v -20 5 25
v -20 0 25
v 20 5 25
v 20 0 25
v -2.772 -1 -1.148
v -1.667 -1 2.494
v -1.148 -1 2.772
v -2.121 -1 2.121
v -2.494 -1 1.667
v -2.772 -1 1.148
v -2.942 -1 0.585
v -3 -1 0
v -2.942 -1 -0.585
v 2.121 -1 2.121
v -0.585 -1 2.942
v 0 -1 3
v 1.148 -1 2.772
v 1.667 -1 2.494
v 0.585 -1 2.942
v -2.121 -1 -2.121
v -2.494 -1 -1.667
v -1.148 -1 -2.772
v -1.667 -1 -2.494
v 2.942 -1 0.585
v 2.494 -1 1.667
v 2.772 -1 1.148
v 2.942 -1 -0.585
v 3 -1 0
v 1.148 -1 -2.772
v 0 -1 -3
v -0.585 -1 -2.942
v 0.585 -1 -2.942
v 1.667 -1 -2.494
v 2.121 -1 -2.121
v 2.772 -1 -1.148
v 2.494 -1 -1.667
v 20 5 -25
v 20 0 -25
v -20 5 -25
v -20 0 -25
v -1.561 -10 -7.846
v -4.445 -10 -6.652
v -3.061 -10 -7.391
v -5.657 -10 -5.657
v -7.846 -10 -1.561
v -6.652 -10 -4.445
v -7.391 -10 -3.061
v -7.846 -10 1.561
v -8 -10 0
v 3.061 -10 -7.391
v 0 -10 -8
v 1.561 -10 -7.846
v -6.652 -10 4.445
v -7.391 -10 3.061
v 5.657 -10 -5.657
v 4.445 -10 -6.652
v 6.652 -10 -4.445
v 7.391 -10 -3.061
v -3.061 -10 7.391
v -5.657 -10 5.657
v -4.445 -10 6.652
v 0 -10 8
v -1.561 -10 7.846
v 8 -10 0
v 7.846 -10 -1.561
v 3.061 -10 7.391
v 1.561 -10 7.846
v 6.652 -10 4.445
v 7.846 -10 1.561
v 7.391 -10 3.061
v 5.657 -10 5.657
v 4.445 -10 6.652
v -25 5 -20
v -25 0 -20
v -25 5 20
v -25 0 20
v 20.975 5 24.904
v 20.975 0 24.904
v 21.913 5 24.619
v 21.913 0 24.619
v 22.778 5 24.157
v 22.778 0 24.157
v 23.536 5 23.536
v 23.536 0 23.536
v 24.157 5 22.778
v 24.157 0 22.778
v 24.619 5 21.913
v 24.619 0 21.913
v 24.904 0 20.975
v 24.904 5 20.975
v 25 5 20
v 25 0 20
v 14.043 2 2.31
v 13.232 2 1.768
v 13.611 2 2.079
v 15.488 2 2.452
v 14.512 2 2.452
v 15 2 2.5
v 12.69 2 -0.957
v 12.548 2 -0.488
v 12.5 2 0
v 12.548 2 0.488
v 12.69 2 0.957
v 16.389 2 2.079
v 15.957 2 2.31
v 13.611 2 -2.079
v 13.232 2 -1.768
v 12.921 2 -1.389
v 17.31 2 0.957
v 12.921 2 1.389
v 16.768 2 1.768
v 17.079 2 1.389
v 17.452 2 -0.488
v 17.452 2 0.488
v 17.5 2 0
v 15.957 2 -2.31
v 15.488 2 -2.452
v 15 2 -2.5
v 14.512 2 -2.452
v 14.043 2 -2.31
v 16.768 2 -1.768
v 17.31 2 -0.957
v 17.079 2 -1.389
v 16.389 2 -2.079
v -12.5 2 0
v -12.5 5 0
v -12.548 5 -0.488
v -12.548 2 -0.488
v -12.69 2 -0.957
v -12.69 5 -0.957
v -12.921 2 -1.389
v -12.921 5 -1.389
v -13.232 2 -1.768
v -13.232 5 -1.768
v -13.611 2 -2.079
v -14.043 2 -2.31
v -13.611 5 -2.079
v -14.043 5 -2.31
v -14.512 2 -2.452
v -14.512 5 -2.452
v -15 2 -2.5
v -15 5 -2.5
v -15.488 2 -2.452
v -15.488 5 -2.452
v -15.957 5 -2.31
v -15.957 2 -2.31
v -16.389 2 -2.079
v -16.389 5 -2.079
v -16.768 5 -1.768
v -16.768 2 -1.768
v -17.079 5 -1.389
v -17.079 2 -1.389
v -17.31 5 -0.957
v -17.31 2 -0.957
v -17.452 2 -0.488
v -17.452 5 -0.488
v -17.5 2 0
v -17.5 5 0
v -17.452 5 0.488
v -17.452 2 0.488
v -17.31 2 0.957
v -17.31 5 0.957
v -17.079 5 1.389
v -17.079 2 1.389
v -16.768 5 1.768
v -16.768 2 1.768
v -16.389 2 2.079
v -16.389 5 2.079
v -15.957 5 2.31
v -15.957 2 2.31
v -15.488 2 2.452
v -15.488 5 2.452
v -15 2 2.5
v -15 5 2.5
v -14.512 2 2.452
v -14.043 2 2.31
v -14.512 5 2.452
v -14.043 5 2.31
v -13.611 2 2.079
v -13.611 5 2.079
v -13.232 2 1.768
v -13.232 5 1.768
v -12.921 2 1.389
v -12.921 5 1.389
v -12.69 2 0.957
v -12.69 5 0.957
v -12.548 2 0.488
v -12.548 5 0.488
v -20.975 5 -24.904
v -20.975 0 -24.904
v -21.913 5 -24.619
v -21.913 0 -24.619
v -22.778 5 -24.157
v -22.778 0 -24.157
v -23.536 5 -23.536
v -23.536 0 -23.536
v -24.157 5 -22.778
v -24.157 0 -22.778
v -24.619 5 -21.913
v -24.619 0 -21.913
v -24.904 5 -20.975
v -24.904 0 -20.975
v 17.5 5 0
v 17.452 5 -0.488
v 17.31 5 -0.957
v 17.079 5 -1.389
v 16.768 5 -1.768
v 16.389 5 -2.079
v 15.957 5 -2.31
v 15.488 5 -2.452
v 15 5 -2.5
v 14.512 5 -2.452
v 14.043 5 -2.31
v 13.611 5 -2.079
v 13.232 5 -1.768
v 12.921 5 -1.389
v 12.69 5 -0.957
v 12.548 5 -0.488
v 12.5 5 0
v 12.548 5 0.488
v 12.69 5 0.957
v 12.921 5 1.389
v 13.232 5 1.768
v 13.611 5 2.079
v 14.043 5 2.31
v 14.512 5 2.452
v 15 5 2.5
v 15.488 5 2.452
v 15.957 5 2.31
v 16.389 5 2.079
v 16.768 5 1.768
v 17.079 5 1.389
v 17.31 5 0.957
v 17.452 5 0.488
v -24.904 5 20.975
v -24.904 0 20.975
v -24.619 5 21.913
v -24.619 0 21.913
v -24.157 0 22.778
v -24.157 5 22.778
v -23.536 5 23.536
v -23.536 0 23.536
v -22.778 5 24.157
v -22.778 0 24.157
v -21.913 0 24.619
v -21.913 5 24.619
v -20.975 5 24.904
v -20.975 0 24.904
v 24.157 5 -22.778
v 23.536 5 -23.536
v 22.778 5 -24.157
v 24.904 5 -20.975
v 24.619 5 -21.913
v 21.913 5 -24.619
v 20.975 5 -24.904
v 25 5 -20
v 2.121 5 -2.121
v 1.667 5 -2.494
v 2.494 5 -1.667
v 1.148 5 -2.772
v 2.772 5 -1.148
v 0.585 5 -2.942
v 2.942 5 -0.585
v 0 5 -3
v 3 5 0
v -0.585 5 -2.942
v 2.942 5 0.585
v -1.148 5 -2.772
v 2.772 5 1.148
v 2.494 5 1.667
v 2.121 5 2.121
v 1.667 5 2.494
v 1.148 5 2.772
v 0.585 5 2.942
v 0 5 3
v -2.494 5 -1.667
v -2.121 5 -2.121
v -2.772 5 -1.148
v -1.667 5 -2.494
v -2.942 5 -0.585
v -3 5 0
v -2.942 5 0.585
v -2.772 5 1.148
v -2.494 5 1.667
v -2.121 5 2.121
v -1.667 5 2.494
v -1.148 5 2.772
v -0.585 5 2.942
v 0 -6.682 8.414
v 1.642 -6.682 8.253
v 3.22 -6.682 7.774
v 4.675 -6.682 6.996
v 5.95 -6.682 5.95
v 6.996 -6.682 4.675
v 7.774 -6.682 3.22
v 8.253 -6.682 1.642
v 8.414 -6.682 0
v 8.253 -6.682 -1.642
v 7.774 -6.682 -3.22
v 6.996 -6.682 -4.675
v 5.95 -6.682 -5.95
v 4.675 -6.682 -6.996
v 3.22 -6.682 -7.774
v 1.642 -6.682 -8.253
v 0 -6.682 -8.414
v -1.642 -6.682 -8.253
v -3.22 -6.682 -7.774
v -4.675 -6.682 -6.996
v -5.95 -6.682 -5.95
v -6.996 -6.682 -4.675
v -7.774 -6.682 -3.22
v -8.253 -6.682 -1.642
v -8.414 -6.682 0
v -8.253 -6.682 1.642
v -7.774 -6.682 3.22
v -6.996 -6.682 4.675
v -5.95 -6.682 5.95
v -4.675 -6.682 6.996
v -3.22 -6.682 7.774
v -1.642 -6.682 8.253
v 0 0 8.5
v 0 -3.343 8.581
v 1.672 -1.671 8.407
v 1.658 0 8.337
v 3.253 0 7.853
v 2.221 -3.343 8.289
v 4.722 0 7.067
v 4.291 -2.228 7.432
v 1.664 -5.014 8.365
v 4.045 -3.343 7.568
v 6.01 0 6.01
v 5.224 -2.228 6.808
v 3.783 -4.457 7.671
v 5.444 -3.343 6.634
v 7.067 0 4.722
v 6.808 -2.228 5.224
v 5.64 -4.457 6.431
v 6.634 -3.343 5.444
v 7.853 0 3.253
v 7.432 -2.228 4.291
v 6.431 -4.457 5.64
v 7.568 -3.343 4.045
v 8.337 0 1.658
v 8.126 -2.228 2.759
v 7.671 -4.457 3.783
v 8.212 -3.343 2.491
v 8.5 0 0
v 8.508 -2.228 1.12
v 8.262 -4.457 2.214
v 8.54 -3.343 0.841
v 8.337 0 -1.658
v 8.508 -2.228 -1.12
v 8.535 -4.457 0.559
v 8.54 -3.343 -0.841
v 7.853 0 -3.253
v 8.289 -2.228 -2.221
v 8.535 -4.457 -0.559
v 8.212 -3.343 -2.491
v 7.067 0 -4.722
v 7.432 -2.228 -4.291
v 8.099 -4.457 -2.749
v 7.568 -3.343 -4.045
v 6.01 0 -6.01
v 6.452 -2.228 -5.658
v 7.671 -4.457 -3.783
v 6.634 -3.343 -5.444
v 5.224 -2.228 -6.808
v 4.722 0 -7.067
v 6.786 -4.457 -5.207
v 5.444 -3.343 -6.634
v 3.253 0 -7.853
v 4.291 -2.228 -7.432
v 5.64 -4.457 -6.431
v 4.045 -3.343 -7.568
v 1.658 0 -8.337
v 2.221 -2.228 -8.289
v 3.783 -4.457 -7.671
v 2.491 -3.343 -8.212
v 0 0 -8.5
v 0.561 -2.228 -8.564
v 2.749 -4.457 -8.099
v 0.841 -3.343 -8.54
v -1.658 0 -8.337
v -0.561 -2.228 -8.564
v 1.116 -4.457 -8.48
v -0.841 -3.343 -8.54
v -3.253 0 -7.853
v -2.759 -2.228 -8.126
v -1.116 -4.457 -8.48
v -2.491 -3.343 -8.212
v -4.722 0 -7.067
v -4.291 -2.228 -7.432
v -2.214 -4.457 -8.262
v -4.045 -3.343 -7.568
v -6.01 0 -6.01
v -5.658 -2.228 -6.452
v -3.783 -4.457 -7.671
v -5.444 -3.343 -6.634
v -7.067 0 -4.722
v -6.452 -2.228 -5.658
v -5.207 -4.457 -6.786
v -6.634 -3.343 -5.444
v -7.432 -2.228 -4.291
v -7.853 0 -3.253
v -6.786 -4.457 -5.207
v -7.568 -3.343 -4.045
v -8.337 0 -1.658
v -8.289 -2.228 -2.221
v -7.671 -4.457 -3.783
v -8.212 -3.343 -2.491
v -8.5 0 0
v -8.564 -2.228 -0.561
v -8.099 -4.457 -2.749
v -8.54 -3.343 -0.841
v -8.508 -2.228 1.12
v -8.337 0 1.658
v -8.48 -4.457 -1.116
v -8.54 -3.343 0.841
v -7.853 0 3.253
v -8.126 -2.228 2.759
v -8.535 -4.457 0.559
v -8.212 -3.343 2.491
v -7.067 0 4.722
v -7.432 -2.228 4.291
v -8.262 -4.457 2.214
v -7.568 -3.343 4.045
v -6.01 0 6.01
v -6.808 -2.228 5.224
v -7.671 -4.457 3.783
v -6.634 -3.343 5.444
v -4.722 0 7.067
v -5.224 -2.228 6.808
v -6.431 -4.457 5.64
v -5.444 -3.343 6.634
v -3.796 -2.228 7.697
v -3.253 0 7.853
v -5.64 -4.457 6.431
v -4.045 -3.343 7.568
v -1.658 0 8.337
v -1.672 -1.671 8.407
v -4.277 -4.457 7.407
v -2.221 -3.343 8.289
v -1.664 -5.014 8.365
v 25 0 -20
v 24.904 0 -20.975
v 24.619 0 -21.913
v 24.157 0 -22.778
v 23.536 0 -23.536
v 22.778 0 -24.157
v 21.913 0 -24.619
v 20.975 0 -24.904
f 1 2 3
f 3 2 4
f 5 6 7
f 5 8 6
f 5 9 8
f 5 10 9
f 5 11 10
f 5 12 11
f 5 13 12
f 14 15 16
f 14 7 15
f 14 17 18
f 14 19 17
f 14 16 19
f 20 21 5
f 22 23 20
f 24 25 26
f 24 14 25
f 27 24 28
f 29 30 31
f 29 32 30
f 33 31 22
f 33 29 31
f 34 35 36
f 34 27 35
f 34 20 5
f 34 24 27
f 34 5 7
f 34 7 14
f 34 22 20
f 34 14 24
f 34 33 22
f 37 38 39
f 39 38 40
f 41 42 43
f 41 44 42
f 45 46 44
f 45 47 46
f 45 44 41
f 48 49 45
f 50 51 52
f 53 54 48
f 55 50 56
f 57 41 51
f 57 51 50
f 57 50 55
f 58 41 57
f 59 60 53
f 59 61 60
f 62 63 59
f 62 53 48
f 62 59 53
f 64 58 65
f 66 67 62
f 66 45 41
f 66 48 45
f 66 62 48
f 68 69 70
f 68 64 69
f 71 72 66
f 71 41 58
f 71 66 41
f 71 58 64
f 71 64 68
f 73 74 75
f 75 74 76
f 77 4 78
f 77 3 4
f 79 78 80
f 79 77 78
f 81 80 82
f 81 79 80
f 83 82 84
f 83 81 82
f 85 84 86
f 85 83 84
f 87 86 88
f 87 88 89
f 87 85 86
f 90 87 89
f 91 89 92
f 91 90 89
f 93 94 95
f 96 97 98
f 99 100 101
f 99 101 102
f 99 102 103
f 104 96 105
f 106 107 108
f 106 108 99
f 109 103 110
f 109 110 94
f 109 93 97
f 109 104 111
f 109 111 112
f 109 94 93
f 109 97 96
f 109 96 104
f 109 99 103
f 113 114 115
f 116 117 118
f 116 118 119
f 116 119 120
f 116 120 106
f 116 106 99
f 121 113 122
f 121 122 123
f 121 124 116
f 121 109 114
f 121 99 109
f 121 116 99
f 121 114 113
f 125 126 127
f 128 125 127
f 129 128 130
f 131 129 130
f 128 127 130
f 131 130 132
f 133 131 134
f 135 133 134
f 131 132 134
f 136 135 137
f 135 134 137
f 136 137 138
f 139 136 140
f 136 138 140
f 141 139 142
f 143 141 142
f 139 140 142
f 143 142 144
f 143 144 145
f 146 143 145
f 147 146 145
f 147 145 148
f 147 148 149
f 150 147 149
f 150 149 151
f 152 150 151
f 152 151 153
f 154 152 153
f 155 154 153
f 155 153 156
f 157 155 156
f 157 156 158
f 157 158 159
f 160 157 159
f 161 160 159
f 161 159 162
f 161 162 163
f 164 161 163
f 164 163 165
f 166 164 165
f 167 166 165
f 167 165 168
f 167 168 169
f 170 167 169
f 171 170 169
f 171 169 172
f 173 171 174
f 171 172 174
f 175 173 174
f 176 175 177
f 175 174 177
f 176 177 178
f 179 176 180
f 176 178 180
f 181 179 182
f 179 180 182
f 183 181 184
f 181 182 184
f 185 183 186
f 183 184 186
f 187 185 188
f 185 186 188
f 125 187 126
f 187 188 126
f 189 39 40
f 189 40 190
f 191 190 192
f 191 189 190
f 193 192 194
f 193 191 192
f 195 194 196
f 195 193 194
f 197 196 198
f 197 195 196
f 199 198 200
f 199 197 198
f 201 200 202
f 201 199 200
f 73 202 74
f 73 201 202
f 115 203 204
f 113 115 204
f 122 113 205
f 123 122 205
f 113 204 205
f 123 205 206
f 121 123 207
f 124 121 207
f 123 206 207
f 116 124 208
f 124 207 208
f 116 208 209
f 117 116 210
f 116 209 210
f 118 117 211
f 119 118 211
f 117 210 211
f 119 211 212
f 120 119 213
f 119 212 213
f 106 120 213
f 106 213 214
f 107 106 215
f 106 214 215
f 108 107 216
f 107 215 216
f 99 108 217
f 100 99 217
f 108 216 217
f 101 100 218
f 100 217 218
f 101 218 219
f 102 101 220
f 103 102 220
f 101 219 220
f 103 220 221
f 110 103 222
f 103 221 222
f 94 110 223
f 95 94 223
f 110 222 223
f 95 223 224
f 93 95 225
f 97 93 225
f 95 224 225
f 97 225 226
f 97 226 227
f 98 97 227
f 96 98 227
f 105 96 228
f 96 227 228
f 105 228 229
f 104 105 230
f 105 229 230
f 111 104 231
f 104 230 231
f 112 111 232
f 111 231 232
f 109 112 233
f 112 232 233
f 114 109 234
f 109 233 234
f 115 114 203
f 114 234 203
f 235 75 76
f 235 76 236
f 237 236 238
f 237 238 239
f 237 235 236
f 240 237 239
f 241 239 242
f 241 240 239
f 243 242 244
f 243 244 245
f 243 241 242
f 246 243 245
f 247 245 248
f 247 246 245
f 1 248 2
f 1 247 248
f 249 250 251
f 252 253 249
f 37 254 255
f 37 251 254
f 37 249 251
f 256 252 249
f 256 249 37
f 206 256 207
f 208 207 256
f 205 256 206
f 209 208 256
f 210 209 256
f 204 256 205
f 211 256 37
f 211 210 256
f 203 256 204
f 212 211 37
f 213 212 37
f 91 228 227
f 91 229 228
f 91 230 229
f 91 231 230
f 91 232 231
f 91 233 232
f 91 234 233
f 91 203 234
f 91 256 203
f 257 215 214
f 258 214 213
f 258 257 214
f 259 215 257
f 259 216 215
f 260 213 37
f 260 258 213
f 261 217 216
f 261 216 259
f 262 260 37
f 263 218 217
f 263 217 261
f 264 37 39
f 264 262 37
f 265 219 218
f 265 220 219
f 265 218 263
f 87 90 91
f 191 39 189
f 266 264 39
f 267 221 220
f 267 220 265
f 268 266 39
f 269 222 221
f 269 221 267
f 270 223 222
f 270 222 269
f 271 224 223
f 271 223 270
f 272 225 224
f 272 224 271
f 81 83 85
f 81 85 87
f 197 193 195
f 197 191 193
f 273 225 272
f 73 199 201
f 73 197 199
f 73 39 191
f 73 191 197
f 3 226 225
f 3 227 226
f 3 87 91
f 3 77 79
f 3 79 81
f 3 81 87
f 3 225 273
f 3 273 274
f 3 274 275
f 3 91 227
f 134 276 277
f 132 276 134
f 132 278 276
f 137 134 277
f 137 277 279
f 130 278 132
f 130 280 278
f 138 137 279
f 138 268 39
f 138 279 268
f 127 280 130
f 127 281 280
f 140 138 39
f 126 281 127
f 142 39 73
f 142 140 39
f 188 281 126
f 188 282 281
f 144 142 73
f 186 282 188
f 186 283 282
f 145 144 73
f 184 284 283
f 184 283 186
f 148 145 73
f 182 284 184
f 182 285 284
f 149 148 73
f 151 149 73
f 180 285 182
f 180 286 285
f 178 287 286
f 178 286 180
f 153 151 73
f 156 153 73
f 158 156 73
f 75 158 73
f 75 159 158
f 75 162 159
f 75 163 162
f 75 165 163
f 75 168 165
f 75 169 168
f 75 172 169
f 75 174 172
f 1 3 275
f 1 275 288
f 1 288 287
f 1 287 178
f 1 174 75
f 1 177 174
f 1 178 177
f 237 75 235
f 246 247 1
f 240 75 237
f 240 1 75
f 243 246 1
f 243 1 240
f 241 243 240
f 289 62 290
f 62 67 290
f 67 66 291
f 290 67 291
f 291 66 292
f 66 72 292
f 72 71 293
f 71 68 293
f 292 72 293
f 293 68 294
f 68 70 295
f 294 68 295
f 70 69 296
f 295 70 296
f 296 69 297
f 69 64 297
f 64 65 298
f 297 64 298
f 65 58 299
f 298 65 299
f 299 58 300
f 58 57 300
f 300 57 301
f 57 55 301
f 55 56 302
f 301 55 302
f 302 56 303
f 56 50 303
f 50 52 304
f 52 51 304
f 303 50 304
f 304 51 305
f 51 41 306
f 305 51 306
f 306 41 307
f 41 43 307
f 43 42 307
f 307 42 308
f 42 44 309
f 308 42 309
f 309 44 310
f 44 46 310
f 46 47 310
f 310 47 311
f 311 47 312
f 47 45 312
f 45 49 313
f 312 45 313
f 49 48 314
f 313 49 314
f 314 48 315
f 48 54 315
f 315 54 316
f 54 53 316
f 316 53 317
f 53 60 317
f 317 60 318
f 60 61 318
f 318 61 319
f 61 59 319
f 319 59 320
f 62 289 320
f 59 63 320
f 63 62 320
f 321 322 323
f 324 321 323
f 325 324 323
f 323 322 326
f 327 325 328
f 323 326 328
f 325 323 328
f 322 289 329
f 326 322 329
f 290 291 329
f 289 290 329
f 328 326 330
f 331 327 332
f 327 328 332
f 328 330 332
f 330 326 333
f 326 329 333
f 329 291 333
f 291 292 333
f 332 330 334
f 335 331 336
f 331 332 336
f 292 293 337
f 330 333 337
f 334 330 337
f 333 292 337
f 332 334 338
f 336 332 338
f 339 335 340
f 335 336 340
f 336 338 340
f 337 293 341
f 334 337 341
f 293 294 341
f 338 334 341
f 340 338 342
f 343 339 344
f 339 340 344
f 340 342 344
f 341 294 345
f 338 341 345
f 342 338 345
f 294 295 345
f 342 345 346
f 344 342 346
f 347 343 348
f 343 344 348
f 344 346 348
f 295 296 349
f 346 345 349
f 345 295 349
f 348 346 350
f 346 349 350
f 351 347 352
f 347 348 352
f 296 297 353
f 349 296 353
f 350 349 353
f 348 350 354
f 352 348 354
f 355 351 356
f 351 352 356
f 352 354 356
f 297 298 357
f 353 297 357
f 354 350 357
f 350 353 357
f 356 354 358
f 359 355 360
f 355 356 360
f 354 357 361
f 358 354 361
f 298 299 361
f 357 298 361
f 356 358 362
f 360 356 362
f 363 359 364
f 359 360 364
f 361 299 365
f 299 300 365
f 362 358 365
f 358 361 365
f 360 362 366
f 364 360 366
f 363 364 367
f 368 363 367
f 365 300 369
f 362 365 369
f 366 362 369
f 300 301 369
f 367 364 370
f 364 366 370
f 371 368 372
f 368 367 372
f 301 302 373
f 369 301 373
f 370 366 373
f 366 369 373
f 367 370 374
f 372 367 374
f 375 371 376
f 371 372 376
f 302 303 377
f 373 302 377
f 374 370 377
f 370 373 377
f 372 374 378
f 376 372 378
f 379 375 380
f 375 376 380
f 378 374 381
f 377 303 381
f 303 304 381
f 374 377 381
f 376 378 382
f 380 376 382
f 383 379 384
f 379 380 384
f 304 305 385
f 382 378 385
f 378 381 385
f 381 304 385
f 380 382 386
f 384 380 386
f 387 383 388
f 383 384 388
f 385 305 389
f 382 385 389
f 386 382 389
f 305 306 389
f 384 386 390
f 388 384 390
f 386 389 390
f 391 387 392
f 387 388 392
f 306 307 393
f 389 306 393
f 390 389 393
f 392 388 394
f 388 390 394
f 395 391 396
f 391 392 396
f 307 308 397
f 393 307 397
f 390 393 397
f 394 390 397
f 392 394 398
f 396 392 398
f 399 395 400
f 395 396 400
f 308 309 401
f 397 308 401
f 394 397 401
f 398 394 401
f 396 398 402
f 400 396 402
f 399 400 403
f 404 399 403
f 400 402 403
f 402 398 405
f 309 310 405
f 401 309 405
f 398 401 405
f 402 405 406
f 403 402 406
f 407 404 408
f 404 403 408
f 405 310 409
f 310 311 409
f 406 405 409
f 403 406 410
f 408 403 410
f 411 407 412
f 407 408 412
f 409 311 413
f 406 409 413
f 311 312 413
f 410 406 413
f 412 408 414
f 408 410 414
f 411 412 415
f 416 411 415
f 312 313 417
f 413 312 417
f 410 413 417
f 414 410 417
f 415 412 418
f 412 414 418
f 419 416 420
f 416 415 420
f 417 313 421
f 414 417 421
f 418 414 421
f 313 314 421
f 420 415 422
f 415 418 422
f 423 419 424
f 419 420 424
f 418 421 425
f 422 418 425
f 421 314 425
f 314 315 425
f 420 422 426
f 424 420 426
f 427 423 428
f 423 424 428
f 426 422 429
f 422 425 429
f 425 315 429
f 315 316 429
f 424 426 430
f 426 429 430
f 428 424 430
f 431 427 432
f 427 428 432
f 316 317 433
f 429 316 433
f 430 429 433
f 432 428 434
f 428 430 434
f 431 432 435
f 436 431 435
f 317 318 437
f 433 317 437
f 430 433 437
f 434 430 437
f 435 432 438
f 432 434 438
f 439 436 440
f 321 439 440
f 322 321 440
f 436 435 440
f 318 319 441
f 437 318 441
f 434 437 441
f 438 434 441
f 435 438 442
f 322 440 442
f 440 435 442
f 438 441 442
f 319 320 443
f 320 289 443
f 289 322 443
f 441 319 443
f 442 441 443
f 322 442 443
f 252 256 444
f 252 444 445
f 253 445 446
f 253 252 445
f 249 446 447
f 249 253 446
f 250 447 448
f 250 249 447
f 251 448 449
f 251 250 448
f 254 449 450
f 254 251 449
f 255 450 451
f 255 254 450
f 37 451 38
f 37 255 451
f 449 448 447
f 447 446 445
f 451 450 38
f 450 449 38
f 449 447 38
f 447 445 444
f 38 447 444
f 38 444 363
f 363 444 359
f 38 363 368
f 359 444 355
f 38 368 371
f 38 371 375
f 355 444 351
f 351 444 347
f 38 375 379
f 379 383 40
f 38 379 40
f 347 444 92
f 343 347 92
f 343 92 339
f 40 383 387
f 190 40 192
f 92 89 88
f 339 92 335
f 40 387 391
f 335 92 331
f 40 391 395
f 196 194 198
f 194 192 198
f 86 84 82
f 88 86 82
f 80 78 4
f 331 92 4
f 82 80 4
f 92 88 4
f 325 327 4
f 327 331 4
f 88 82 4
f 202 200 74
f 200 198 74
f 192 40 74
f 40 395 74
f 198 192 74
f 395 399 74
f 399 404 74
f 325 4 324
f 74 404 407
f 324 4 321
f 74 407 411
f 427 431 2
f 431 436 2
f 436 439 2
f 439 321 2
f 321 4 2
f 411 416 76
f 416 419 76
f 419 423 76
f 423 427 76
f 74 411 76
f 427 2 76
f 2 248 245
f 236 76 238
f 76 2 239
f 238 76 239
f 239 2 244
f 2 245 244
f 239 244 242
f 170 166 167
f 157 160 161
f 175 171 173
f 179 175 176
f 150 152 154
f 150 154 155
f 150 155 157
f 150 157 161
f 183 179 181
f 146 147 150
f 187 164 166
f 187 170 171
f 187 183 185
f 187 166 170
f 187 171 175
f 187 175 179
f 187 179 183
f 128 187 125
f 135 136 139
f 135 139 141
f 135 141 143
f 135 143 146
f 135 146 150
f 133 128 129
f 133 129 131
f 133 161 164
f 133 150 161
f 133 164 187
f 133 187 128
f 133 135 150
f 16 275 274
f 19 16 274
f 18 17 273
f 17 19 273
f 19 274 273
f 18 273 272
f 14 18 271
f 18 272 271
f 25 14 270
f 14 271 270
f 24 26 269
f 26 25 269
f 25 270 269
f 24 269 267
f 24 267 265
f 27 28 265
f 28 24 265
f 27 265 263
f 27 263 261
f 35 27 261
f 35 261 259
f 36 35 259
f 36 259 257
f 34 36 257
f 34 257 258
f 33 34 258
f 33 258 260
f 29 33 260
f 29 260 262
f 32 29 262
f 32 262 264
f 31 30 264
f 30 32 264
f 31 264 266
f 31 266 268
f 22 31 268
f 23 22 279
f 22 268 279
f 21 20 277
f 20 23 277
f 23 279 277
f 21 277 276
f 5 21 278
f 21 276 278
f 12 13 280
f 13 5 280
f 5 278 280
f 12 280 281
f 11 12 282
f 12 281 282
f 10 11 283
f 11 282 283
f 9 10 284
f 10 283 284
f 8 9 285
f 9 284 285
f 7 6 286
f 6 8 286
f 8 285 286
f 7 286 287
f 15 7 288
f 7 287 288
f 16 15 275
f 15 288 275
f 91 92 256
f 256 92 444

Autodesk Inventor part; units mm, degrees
ref_plane "YZ Plane" through (0, 0, 0) normal (1, 0, 0) x (0, 1, 0)
ref_plane "XZ Plane" through (0, 0, 0) normal (0, 1, 0) x (-1, 0, 0)
ref_plane "XY Plane" through (0, 0, 0) normal (0, 0, 1) x (1, 0, 0)
sketch "Sketch1" plane through (0, 0, 0) normal (0, 1, 0) x (-1, 0, 0)
  line L0 (25, 25) -> (-25, 25)
  line L1 (-25, 25) -> (-25, -25)
  line L2 (-25, -25) -> (25, -25)
  line L3 (25, -25) -> (25, 25)
  point P0 (0, 0)
  dimension "d0" = 50
  dimension "d1" = 50
  dimension "d2" = 25
  dimension "d3" = 25
extrude "Extrusion1" add sketch "Sketch1" along normal blind 5
sketch "Sketch2" plane through (0, 0, 0) normal (0, -1, 0) x (1, 0, 0)
  circle A0 centre (0, 0) radius 8
  dimension "d6" = 16
extrude "Extrusion2" add sketch "Sketch2" along normal blind 10
sketch "Sketch3" plane through (0, 5, 0) normal (0, 1, 0) x (1, 0, 0)
  line L0 (0, -3) -> (0, -3)
  line L1 (3, 0) -> (3, 0)
  line L2 (0, 3) -> (0, 3)
  line L3 (-3, 0) -> (-3, 0)
  arc A0 (-3, 0) -> (0, -3) centre (0, 0) ccw
  arc A1 (0, 3) -> (-3, 0) centre (0, 0) ccw
  arc A2 (3, 0) -> (0, 3) centre (0, 0) ccw
  arc A3 (0, -3) -> (3, 0) centre (0, 0) ccw
  point P0 (0, 0)
  dimension "d9" = 6
  dimension "d10" = 6
  dimension "d11" = 3
  dimension "d12" = 3
  dimension "d19" = 3
extrude "Extrusion3" cut sketch "Sketch3" against normal blind 6
sketch "Sketch4" plane through (0, 5, 0) normal (0, 1, 0) x (1, 0, 0)
  line L0 (-5, -5) -> (-5, 5) projected
  line L1 (-25, 25) -> (-25, -25) projected
  circle A0 centre (-15, 0) radius 2.5
  line L2 (5, -5) -> (-5, -5) projected
  line L3 (-5, 5) -> (5, 5) projected
  circle A1 centre (15, 0) radius 2.5
  line L4 (25, -25) -> (25, 25) projected
  point P0 (0, 0)
  dimension "d15" = 5
  dimension "d20" = 10
  dimension "d21" = 10
extrude "Extrusion4" cut sketch "Sketch4" against normal blind 3
fillet "Fillet1" radius 5 4 edges at (25, 2.5, 25) (25, 2.5, -25) (-25, 2.5, -25) (-25, 2.5, 25)
sketch "Sketch5" plane through (0, 0, 0) normal (1, 0, 0) x (0, 1, 0)
  line L0 (0, 8) -> (-10, 8) projected
  line L1 (0, 8) -> (0, 8.5)
  line L2 (0, 20) -> (0, -20) projected
  line L3 (-10, 8) -> (-10, -8) projected
  line L4 (-10, 8) -> (0, 8)
  line L5 (-10, 0) -> (0, 0)
  arc A0 (0, 8.5) -> (-10, 8) centre (-2.7668, -36.4149) ccw
  dimension "d23" = 0.5
  dimension "d25" = 45
revolve "Revolution1" add sketch "Sketch5" angle 360 about axis through (0, -10, 0) along (0, 1, 0) contours L0 A0 L1
properties part number "Base"
